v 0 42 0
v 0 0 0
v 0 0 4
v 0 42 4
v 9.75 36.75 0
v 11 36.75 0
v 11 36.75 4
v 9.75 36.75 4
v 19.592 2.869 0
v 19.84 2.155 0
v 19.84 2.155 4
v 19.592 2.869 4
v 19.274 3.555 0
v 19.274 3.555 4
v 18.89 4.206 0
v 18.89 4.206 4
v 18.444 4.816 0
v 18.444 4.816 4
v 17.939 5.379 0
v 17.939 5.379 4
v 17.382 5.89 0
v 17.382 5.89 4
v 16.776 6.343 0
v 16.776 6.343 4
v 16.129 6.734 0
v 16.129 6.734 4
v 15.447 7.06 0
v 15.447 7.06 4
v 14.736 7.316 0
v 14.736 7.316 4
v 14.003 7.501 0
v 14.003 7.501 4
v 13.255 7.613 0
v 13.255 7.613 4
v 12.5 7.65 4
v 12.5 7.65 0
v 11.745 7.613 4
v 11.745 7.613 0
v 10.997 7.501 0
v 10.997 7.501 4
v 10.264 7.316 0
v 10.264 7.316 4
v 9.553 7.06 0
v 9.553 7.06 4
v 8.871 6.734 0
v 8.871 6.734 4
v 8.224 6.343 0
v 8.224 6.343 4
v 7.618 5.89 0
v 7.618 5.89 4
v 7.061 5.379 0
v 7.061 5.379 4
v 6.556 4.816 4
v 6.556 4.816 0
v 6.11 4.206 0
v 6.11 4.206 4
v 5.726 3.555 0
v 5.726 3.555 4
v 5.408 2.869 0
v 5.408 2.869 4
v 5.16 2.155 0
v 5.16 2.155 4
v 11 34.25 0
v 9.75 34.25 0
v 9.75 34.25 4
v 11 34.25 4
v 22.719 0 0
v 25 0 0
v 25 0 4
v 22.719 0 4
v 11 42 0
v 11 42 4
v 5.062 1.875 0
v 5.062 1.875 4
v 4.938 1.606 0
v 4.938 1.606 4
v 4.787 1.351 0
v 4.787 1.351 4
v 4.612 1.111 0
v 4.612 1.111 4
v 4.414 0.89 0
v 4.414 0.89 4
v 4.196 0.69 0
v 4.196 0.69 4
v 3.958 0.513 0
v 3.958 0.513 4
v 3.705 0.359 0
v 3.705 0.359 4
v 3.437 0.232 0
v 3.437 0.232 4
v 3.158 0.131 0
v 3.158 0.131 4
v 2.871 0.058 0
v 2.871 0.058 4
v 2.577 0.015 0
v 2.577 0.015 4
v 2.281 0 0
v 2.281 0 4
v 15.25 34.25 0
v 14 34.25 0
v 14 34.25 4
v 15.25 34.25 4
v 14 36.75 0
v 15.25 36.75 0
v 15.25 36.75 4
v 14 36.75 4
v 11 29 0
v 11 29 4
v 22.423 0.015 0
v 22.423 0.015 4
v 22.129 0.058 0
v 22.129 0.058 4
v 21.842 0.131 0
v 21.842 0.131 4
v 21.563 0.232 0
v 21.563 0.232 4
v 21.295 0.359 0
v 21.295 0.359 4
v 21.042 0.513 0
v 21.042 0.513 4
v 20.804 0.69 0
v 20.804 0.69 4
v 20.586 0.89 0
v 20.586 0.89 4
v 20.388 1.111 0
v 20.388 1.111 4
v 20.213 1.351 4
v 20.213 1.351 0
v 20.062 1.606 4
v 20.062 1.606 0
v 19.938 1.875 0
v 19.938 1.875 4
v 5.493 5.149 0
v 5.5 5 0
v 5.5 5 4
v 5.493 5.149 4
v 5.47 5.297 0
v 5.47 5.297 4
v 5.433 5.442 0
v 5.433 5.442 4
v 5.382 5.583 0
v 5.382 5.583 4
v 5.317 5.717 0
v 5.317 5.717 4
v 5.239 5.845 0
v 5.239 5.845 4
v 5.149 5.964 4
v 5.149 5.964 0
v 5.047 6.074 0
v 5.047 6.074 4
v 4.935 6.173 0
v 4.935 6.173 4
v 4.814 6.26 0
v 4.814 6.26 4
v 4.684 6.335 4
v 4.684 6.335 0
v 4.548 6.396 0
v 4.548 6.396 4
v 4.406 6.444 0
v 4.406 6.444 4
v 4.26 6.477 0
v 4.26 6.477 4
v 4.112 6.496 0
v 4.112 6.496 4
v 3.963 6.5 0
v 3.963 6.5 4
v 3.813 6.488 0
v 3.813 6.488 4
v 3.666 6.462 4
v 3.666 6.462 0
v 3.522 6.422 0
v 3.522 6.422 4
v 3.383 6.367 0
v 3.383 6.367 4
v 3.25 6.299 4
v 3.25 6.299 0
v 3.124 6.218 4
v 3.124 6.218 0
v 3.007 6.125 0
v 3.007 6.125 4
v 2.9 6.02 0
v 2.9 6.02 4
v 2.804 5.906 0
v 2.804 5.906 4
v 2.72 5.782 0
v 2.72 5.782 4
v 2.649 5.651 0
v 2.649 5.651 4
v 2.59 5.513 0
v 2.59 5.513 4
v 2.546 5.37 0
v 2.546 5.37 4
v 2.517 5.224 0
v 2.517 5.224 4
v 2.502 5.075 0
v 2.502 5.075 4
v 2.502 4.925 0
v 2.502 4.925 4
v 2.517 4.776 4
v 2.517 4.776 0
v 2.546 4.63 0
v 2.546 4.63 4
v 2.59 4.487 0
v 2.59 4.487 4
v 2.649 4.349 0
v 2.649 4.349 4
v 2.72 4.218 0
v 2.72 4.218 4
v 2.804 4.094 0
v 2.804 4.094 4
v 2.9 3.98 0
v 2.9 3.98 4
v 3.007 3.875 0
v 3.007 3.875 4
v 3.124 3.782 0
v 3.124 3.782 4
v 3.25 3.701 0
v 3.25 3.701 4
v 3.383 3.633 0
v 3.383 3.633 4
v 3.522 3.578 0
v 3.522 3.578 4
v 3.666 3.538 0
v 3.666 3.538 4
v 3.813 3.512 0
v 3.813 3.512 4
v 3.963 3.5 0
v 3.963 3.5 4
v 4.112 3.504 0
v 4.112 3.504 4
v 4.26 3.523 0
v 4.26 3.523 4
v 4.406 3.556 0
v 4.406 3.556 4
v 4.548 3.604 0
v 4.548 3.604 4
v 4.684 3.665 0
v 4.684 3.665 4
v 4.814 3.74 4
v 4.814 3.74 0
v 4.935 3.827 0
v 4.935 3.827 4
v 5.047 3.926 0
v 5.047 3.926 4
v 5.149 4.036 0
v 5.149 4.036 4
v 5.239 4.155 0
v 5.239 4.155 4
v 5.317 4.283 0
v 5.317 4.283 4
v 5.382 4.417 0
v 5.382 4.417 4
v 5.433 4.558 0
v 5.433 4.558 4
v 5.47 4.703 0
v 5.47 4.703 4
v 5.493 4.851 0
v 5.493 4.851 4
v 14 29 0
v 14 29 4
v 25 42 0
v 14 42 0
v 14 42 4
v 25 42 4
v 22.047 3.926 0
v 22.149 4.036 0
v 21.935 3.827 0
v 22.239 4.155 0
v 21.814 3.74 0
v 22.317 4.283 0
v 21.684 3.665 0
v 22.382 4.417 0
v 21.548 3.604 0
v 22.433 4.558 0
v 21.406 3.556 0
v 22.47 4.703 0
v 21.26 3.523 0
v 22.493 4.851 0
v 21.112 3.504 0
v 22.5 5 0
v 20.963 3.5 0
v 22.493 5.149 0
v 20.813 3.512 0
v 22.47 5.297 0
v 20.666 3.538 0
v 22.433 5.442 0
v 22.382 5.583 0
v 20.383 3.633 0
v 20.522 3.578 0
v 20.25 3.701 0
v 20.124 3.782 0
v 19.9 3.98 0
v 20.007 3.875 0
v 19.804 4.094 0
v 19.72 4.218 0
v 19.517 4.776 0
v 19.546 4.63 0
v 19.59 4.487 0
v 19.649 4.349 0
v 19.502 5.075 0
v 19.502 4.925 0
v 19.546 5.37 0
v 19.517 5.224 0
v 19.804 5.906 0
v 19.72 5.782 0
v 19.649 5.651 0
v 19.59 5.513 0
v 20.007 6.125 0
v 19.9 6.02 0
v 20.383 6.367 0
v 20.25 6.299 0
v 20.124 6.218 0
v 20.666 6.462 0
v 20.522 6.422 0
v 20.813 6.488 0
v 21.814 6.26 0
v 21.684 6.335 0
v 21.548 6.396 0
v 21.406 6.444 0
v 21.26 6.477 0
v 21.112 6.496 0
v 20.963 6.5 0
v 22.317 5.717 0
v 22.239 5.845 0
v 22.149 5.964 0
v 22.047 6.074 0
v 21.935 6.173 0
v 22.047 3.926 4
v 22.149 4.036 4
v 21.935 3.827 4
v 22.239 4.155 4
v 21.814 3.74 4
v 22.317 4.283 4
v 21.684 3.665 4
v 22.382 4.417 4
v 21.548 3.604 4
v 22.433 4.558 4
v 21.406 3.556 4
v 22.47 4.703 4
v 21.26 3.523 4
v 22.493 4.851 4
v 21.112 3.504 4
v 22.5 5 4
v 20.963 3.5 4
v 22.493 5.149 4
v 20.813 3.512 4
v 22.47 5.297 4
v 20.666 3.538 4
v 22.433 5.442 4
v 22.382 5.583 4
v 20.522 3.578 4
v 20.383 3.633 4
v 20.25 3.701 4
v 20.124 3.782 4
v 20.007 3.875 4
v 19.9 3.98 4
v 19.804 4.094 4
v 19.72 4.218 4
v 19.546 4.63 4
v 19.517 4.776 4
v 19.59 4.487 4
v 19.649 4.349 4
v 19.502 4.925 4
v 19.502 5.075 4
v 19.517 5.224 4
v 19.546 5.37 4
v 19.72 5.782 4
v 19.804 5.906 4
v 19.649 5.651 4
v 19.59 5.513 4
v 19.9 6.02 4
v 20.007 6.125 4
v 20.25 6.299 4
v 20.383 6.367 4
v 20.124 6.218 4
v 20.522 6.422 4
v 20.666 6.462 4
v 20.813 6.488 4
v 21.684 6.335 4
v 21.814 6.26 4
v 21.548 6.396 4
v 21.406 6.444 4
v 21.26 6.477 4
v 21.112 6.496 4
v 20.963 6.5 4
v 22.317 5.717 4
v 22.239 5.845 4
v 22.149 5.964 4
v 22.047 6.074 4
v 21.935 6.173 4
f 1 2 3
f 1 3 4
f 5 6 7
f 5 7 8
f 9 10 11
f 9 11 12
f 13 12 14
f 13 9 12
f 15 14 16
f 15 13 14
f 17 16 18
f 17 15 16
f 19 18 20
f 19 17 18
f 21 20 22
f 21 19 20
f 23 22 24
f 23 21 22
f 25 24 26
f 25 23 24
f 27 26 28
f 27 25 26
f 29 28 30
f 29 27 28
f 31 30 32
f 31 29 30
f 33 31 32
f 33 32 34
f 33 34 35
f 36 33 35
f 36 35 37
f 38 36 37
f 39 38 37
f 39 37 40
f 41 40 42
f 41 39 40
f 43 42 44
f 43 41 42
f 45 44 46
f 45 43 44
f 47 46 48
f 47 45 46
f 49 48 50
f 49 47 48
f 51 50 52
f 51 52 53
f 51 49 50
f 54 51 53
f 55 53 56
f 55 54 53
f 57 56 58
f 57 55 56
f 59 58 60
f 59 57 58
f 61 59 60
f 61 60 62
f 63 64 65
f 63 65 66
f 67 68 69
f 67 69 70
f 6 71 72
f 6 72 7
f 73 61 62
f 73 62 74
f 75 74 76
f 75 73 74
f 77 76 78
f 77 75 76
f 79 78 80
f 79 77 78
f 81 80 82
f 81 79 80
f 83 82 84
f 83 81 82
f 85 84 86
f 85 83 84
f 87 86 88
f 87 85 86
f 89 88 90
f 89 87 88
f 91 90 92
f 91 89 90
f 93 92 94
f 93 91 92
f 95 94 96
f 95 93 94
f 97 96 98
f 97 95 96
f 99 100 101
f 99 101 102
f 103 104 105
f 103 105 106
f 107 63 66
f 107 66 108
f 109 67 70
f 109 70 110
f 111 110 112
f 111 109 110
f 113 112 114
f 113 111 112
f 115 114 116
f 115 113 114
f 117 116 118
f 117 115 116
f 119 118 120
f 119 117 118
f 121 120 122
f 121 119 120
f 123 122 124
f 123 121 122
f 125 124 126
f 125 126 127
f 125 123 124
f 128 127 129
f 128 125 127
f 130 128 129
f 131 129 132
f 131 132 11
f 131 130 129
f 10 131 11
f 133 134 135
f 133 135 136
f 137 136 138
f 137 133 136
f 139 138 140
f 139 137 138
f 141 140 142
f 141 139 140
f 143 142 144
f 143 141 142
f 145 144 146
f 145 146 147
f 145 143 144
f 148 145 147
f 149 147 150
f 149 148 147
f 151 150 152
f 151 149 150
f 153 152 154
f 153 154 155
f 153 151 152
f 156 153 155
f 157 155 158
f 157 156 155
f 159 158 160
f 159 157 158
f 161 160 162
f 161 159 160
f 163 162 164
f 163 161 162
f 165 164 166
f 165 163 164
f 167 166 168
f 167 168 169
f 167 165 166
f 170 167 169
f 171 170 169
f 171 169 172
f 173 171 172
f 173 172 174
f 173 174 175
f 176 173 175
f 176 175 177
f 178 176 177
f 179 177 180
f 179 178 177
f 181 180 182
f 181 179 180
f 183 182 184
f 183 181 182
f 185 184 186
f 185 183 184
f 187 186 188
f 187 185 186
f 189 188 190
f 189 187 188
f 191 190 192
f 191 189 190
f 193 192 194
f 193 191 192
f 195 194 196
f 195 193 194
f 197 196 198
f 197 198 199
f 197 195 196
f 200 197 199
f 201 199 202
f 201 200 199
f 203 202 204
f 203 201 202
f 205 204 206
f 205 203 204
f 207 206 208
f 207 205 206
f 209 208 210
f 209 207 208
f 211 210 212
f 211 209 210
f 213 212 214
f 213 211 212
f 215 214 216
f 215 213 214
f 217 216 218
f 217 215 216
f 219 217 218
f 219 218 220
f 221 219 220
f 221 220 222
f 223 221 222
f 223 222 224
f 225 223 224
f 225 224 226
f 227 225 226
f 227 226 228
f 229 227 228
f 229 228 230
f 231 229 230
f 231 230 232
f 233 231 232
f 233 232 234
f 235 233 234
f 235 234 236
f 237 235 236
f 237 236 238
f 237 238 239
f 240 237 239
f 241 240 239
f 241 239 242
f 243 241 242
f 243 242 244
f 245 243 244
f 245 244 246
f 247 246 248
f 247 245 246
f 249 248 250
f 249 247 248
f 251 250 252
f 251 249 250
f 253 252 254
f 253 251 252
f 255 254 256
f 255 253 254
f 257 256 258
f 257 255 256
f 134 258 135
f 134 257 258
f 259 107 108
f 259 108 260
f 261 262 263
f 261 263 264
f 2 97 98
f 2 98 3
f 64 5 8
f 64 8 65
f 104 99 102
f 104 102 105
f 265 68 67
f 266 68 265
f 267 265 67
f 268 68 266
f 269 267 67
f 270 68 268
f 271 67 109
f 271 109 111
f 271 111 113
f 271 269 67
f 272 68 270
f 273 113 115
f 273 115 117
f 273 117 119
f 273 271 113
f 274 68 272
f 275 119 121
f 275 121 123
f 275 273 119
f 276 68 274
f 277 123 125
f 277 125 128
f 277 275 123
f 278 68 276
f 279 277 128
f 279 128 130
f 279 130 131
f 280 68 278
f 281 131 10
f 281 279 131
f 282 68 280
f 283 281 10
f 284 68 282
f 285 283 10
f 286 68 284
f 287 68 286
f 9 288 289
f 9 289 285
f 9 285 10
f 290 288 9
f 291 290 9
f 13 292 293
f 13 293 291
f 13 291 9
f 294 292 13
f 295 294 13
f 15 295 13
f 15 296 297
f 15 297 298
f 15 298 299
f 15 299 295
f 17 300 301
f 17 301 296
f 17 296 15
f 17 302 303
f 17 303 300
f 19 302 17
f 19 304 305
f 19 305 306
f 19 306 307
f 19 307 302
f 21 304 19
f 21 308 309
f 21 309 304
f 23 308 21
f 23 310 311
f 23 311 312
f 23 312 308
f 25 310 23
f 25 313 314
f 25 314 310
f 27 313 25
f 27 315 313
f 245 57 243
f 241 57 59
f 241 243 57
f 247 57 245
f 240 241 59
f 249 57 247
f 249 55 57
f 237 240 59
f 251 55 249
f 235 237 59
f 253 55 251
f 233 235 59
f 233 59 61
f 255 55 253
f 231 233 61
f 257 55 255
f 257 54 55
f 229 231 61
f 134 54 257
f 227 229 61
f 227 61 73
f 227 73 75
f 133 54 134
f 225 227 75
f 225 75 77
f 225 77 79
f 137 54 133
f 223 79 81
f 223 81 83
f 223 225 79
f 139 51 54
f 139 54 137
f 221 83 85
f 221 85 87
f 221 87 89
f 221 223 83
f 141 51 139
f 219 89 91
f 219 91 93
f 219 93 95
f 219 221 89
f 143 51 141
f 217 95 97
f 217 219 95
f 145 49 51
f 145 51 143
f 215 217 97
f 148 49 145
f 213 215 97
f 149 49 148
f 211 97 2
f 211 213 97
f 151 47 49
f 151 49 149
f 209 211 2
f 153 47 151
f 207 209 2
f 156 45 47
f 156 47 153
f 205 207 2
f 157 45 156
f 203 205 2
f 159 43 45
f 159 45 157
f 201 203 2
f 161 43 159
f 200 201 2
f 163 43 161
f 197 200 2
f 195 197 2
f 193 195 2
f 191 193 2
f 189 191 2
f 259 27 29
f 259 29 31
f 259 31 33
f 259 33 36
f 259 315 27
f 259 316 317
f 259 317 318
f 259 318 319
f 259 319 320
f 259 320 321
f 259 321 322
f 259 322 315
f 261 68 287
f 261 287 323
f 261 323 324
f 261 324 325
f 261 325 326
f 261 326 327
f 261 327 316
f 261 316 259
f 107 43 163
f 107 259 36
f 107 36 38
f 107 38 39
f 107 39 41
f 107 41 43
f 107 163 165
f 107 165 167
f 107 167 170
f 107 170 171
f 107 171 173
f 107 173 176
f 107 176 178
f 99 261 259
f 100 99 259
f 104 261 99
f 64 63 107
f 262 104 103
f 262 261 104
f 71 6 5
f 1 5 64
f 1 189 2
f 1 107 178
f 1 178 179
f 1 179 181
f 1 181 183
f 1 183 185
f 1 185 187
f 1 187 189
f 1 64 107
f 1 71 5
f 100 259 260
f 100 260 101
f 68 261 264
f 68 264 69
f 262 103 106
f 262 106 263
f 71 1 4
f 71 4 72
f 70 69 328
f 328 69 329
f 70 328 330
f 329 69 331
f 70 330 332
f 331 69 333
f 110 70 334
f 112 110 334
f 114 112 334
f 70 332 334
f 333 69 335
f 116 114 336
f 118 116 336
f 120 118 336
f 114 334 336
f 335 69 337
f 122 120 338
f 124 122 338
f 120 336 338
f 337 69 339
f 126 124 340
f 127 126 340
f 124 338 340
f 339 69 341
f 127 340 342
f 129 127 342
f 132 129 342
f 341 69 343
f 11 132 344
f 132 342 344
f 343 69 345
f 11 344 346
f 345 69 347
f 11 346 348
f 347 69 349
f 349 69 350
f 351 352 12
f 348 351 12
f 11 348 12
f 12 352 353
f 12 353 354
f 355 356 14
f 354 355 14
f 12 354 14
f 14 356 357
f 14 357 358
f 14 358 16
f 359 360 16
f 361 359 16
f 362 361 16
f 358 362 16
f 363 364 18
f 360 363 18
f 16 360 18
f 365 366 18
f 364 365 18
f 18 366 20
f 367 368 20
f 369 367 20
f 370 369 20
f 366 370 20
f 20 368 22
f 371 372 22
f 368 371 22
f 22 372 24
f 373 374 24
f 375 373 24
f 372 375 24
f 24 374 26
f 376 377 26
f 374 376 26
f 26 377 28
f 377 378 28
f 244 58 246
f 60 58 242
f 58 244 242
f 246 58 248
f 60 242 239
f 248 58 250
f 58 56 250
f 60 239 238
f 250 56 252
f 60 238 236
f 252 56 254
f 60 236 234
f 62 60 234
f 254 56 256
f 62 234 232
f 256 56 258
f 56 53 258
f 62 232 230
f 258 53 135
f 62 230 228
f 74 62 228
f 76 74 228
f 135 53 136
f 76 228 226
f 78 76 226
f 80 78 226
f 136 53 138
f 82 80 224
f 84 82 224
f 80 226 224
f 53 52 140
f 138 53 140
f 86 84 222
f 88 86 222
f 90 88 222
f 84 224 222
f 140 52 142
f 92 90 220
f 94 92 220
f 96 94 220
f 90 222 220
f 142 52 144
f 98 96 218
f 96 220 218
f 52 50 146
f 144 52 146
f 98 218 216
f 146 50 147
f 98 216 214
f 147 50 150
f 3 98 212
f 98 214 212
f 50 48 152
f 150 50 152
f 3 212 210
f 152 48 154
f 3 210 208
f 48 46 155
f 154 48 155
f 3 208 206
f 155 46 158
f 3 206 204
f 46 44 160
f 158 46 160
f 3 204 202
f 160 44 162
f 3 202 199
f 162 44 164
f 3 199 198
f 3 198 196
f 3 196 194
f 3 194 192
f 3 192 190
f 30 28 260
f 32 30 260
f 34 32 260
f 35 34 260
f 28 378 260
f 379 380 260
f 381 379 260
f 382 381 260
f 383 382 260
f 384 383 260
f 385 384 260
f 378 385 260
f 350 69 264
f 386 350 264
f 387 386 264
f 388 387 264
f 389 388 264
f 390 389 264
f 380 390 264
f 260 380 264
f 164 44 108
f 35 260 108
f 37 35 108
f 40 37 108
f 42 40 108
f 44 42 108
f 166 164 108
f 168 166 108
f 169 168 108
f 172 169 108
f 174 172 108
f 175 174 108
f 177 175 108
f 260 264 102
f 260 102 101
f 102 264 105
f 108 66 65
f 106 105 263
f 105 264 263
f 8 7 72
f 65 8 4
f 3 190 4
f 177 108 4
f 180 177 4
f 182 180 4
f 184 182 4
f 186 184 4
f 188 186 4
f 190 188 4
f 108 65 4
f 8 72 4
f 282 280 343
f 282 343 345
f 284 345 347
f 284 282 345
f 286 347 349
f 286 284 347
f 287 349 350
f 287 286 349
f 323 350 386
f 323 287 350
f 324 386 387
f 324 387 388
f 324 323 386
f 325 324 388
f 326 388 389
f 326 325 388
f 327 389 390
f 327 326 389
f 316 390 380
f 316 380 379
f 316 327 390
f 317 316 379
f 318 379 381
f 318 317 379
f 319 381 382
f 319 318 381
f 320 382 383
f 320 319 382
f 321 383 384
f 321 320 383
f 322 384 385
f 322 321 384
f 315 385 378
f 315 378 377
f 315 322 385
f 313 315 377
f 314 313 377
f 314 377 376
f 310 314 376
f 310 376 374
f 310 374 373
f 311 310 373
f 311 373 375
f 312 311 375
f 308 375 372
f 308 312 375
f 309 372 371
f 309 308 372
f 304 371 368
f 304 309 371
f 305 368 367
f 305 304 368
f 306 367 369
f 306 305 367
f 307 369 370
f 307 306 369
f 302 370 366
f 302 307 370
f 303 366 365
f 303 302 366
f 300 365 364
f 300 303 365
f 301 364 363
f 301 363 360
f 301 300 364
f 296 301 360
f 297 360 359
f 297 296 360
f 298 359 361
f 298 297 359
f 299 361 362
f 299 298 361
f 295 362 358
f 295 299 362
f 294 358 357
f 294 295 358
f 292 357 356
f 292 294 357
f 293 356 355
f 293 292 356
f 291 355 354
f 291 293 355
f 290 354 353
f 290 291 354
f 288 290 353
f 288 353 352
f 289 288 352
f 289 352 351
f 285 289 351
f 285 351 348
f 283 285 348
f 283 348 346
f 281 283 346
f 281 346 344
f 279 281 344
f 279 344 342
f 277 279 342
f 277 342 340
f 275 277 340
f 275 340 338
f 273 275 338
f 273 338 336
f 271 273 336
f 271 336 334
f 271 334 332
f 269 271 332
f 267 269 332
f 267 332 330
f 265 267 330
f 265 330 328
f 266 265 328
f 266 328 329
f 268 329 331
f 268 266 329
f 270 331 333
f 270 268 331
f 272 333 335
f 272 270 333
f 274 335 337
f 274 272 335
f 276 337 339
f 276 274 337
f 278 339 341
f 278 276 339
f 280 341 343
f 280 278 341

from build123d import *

# Parameters (mm, degrees)
SKETCH_1_R      = 1.5
EXTRUDE_1_DEPTH = 4


with BuildPart() as part:
    # Эскиз1 → Бобышка-Вытянуть1 (new body)
    with BuildSketch(Plane.XY):
        with BuildLine():
            Line((11, 42), (11, 36.75))
            Line((11, 36.75), (9.75, 36.75))
            Line((9.75, 36.75), (9.75, 34.25))
            Line((9.75, 34.25), (11, 34.25))
            Line((11, 34.25), (11, 29))
            Line((11, 29), (14, 29))
            Line((14, 29), (14, 34.25))
            Line((14, 34.25), (15.25, 34.25))
            Line((15.25, 34.25), (15.25, 36.75))
            Line((15.25, 36.75), (14, 36.75))
            Line((14, 36.75), (14, 42))
            Line((14, 42), (25, 42))
            Line((25, 42), (25, 0))
            Line((25, 0), (22.718732798, 0))
            ThreePointArc((22.718732798, 0), (20.920846715, 0.598416016), (19.840216517, 2.154929577))
            ThreePointArc((19.840216517, 2.154929577), (12.5, 7.65), (5.159783483, 2.154929577))
            ThreePointArc((5.159783483, 2.154929577), (4.079153285, 0.598416016), (2.281267202, 0))
            Line((2.281267202, 0), (0, 0))
            Line((0, 0), (0, 42))
            Line((0, 42), (11, 42))
        make_face()
        with Locations((4, 5)):
            Circle(SKETCH_1_R, mode=Mode.SUBTRACT)
        with Locations((21, 5)):
            Circle(SKETCH_1_R, mode=Mode.SUBTRACT)
    extrude(amount=EXTRUDE_1_DEPTH)


solid = part.part
